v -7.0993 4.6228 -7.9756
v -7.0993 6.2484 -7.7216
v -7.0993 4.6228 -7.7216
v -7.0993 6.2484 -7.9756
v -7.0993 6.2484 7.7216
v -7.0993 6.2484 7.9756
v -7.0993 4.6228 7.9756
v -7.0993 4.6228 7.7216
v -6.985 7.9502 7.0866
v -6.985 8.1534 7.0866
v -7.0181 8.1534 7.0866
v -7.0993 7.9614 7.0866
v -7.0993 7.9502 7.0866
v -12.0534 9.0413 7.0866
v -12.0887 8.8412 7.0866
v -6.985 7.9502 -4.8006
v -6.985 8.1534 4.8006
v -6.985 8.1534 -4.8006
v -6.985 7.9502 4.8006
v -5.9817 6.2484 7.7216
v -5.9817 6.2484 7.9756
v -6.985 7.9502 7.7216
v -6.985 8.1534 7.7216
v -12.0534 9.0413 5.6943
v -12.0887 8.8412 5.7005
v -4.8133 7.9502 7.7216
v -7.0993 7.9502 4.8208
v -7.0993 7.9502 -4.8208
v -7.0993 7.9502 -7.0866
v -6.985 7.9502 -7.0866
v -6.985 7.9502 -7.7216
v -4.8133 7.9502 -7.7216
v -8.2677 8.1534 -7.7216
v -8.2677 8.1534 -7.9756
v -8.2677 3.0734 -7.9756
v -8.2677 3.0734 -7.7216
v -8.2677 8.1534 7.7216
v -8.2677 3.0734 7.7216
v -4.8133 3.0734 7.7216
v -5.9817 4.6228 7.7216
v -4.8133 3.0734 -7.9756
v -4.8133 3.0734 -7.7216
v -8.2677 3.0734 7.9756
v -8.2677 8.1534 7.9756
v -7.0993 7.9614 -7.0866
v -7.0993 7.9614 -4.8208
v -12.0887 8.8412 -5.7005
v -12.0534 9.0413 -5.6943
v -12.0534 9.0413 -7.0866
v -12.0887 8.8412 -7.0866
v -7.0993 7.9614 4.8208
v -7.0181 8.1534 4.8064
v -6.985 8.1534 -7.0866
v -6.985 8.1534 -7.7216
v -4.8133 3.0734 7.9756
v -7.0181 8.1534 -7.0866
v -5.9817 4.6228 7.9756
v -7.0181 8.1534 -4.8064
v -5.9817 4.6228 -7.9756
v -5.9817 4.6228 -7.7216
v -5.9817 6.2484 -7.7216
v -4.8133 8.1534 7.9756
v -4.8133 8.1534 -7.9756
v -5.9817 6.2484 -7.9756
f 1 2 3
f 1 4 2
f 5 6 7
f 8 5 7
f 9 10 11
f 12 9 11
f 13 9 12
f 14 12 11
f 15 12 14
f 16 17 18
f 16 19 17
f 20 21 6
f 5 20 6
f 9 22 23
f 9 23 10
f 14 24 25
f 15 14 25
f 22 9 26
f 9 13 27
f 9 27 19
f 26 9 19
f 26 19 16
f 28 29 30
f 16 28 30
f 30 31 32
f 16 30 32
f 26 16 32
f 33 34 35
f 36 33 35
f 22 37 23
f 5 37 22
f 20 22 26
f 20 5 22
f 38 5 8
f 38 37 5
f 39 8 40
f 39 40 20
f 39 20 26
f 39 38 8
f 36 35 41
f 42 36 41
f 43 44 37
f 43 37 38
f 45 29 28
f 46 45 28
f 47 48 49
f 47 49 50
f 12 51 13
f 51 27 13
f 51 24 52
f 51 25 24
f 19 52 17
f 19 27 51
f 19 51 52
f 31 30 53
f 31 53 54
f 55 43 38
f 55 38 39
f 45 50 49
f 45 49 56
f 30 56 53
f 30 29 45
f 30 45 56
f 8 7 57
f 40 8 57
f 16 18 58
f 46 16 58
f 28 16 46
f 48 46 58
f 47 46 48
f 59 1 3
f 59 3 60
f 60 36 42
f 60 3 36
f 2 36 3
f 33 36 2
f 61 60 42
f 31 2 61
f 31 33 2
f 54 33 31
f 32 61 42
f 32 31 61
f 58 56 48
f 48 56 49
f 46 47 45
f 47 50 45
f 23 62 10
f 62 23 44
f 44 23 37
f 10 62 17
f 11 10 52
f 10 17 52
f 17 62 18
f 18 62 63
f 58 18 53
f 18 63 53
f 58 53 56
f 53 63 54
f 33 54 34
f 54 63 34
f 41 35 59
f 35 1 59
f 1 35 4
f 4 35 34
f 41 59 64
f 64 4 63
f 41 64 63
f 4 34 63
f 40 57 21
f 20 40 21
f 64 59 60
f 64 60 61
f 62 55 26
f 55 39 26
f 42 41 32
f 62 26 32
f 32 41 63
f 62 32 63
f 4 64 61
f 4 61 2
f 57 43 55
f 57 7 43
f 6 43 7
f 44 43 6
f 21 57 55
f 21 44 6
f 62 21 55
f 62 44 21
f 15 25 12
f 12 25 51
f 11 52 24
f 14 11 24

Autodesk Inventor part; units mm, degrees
sketch "Sketch_1" plane through (0, 0, 7.9756) normal (0, 0, 1) x (1, 0, 0)
  line L0 (-8.2677, 3.0734) -> (-4.8133, 3.0734)
  line L1 (-4.8133, 3.0734) -> (-4.8133, 8.1534)
  line L2 (-4.8133, 8.1534) -> (-8.2677, 8.1534)
  line L3 (-8.2677, 8.1534) -> (-8.2677, 3.0734)
  line L4 (-7.0993, 6.2484) -> (-7.0993, 4.6228)
  line L5 (-7.0993, 4.6228) -> (-5.9817, 4.6228)
  line L6 (-5.9817, 4.6228) -> (-5.9817, 6.2484)
  line L7 (-5.9817, 6.2484) -> (-7.0993, 6.2484)
extrude "Extrusion1" add sketch "Sketch_1" against normal blind 0.254
sketch "Sketch_2" plane through (0, 7.9502, 0) normal (0, 1, 0) x (1, 0, 0)
  line L0 (-7.0993, 7.9756) -> (-7.0993, -7.9756)
  line L1 (-7.0993, -7.9756) -> (-4.8133, -7.9756)
  line L2 (-4.8133, -7.9756) -> (-4.8133, 7.9756)
  line L3 (-4.8133, 7.9756) -> (-7.0993, 7.9756)
extrude "Extrusion2" add sketch "Sketch_2" along normal blind 0.2032
sketch "Sketch_3" plane through (0, 0, -7.9756) normal (0, 0, 1) x (1, 0, 0)
  line L0 (-8.2677, 3.0734) -> (-4.8133, 3.0734)
  line L1 (-4.8133, 3.0734) -> (-4.8133, 8.1534)
  line L2 (-4.8133, 8.1534) -> (-8.2677, 8.1534)
  line L3 (-8.2677, 8.1534) -> (-8.2677, 3.0734)
  line L4 (-7.0993, 6.2484) -> (-7.0993, 4.6228)
  line L5 (-7.0993, 4.6228) -> (-5.9817, 4.6228)
  line L6 (-5.9817, 4.6228) -> (-5.9817, 6.2484)
  line L7 (-5.9817, 6.2484) -> (-7.0993, 6.2484)
extrude "Extrusion3" add sketch "Sketch_3" along normal blind 0.254
sketch "Sketch_5" plane through (0, 0, 0) normal (0, 0, 1) x (1, 0, 0)
  line L0 (-12.0887, 8.8412) -> (-7.0358, 7.9502)
  line L1 (-7.0358, 7.9502) -> (-7.0005, 8.1503)
  line L2 (-7.0005, 8.1503) -> (-12.0534, 9.0413)
  line L3 (-12.0534, 9.0413) -> (-12.0887, 8.8412)
extrude "Extrusion4" add sketch "Sketch_5" along normal mid plane 15.4432
sketch "Sketch_6" plane through (0, 7.9502, 0) normal (0, 1, 0) x (1, 0, 0)
  line L0 (-15.494, -7.7216) -> (-6.985, -7.7216)
  line L1 (-6.985, -7.7216) -> (-6.985, -7.0866)
  line L2 (-6.985, -7.0866) -> (-14.732, -7.0866)
  line L3 (-14.732, -7.0866) -> (-14.732, -6.1666)
  line L4 (-14.732, -6.1666) -> (-6.985, -4.8006)
  line L5 (-6.985, -4.8006) -> (-6.985, 4.8006)
  line L6 (-6.985, 4.8006) -> (-14.732, 6.1666)
  line L7 (-14.732, 6.1666) -> (-14.732, 7.0866)
  line L8 (-14.732, 7.0866) -> (-6.985, 7.0866)
  line L9 (-6.985, 7.0866) -> (-6.985, 7.7216)
  line L10 (-6.985, 7.7216) -> (-15.494, 7.7216)
  line L11 (-15.494, 7.7216) -> (-15.494, -7.7216)
extrude "Extrusion5" cut sketch "Sketch_6" along normal blind 2.54
ref_plane "metal_to_body_XY" through (-0.508, 0, 0) normal (1, 0, 0) x (0, 0, -1)
ref_plane "metal_to_body_YZ" through (-0.508, 0, 0) normal (0, 0, -1) x (0, 1, 0)
ref_plane "metal_to_body_ZX" through (-0.508, 0, 0) normal (0, 1, 0) x (1, 0, 0)
properties part number "UB216KKW015C-NR"
